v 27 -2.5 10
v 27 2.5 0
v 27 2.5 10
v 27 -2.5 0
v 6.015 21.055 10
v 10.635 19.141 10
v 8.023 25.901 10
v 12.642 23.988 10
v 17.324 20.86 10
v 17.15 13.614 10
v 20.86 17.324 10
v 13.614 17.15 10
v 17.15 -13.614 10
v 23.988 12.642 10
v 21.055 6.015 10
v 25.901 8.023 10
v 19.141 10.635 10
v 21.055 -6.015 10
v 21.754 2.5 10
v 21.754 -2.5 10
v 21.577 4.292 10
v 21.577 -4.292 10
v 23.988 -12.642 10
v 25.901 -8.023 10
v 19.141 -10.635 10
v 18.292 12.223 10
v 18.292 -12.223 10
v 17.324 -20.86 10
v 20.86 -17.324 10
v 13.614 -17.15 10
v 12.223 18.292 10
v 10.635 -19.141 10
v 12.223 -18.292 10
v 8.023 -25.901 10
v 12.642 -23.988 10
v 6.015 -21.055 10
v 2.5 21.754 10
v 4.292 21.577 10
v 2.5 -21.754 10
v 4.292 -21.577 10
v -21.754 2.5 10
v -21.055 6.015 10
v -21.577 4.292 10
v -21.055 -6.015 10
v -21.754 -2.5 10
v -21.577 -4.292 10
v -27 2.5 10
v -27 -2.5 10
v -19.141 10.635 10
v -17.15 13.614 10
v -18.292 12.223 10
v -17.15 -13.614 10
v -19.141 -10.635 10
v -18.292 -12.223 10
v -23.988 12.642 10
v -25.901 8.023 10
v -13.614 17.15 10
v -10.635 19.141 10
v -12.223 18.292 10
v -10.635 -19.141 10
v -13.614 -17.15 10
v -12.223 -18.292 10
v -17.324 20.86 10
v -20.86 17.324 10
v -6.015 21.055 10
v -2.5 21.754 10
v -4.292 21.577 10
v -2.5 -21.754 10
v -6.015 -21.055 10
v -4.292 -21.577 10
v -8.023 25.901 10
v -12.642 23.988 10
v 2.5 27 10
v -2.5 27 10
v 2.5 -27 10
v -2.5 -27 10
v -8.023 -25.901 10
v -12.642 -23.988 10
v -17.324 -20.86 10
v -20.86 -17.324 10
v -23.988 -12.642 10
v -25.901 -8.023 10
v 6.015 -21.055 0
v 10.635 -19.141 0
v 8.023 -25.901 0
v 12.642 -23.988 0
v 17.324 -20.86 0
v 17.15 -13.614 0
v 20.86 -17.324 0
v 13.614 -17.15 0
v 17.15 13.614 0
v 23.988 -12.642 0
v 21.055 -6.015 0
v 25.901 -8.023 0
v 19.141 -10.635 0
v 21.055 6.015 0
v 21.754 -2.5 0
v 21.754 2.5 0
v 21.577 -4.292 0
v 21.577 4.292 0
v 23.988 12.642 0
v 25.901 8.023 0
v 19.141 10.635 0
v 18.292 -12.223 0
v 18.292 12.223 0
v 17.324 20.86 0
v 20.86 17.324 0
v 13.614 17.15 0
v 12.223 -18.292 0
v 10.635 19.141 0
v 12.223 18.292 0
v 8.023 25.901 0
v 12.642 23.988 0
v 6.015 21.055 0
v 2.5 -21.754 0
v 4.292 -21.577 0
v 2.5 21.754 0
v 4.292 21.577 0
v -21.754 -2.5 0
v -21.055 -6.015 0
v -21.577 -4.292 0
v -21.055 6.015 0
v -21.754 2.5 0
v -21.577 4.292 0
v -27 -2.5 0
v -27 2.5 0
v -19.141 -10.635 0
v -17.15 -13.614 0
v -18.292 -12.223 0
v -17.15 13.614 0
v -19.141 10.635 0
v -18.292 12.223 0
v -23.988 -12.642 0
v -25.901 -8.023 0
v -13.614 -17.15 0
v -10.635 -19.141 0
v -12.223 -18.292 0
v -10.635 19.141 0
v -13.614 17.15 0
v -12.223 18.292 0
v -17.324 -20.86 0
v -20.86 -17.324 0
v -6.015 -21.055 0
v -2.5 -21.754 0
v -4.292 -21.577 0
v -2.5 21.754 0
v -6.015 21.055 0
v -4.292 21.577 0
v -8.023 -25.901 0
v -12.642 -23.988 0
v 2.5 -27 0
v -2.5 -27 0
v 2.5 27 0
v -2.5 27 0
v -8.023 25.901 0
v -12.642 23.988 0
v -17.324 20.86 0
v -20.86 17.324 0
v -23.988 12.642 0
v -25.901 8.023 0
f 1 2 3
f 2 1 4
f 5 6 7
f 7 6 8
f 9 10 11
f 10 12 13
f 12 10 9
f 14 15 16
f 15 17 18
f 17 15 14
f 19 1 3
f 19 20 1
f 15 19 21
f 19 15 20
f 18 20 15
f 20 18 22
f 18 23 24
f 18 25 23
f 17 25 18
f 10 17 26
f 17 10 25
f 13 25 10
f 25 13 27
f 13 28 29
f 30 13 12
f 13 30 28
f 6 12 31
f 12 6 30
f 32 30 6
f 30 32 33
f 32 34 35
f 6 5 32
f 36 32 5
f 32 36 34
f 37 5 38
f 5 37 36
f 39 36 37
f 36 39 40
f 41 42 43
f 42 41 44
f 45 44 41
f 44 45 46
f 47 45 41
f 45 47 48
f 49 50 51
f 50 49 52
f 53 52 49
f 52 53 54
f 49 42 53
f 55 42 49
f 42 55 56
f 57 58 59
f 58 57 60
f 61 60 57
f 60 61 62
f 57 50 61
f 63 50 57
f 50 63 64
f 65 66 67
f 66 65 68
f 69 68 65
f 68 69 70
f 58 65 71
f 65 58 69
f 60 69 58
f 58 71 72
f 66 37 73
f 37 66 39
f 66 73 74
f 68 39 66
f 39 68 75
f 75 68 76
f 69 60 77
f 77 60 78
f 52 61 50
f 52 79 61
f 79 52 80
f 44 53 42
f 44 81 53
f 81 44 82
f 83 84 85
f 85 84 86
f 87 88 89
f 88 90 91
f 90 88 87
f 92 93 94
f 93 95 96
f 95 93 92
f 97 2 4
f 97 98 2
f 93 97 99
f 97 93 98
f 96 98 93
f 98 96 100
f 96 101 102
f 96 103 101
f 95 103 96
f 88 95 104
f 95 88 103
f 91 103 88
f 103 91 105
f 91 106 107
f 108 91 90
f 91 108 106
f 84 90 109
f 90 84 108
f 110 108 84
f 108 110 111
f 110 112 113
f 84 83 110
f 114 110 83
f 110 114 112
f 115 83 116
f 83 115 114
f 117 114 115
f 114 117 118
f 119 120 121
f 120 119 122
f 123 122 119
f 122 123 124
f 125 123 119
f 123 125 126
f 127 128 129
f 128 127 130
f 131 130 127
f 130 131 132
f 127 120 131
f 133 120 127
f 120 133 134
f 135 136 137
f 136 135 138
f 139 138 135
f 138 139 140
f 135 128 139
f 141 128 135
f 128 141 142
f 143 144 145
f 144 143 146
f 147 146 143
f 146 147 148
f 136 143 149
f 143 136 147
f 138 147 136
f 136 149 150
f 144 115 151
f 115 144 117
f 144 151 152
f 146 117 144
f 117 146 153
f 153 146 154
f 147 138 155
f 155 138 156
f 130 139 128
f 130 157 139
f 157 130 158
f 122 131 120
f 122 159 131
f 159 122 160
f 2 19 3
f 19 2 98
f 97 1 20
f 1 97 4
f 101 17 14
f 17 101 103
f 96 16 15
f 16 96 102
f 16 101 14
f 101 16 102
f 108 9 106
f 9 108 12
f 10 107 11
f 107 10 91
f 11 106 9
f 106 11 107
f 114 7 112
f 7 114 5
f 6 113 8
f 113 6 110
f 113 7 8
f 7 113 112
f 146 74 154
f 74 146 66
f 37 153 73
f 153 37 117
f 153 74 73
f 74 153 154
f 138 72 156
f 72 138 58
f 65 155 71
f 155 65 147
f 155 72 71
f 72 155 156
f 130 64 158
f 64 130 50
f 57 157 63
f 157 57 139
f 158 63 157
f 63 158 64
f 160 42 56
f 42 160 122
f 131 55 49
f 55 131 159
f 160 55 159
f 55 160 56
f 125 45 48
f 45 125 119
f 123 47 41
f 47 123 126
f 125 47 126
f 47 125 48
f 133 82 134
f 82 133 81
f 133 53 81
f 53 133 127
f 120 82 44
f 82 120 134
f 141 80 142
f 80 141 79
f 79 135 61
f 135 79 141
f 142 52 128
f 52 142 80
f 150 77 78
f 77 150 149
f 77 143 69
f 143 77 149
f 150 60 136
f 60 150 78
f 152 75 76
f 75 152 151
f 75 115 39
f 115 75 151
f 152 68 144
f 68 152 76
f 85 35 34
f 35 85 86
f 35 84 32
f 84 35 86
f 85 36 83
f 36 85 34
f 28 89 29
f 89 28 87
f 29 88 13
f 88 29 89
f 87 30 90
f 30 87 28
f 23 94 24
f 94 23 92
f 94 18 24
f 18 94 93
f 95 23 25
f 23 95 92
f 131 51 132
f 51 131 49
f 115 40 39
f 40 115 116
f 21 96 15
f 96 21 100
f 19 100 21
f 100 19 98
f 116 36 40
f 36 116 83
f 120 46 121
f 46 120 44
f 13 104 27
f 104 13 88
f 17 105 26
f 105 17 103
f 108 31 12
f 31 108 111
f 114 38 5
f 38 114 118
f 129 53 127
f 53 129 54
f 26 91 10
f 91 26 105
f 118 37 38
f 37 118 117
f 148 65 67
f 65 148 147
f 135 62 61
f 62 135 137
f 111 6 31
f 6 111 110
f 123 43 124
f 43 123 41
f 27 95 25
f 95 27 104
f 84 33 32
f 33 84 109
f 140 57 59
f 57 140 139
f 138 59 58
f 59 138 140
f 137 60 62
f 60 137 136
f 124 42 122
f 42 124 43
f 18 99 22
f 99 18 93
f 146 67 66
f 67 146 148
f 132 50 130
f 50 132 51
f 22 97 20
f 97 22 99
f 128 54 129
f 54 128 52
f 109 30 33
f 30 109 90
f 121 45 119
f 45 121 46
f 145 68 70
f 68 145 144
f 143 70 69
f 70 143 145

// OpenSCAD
$fn = 32;

// ----------------------------------------------------------------------
// Spur blank: plain gear blank
// ----------------------------------------------------------------------

// --- parameters (mm) ---
disc_r = 22;              // blank root radius
disc_t = 10;              // blank thickness
n_teeth = 16;             // stub tooth count
tooth_w = 5;              // tooth width at the root
tooth_h = 5;              // tooth height above the root
fit_tol = 0.02;           // tolerance for press fits, mm
free_tol = 0.2;           // tolerance for clearance fits, mm

out_r = disc_r + tooth_h;  // tip radius
bbox_x = 54.0;  // measured width over the teeth
bbox_y = 54.0;  // measured depth over the teeth

union() {
  cylinder(r = disc_r, h = disc_t);
  for (i = [0 : n_teeth - 1])
    rotate([0, 0, i * 360 / n_teeth])
      translate([disc_r - 1, -tooth_w / 2, 0])
        cube([tooth_h + 1, tooth_w, disc_t]);
}
